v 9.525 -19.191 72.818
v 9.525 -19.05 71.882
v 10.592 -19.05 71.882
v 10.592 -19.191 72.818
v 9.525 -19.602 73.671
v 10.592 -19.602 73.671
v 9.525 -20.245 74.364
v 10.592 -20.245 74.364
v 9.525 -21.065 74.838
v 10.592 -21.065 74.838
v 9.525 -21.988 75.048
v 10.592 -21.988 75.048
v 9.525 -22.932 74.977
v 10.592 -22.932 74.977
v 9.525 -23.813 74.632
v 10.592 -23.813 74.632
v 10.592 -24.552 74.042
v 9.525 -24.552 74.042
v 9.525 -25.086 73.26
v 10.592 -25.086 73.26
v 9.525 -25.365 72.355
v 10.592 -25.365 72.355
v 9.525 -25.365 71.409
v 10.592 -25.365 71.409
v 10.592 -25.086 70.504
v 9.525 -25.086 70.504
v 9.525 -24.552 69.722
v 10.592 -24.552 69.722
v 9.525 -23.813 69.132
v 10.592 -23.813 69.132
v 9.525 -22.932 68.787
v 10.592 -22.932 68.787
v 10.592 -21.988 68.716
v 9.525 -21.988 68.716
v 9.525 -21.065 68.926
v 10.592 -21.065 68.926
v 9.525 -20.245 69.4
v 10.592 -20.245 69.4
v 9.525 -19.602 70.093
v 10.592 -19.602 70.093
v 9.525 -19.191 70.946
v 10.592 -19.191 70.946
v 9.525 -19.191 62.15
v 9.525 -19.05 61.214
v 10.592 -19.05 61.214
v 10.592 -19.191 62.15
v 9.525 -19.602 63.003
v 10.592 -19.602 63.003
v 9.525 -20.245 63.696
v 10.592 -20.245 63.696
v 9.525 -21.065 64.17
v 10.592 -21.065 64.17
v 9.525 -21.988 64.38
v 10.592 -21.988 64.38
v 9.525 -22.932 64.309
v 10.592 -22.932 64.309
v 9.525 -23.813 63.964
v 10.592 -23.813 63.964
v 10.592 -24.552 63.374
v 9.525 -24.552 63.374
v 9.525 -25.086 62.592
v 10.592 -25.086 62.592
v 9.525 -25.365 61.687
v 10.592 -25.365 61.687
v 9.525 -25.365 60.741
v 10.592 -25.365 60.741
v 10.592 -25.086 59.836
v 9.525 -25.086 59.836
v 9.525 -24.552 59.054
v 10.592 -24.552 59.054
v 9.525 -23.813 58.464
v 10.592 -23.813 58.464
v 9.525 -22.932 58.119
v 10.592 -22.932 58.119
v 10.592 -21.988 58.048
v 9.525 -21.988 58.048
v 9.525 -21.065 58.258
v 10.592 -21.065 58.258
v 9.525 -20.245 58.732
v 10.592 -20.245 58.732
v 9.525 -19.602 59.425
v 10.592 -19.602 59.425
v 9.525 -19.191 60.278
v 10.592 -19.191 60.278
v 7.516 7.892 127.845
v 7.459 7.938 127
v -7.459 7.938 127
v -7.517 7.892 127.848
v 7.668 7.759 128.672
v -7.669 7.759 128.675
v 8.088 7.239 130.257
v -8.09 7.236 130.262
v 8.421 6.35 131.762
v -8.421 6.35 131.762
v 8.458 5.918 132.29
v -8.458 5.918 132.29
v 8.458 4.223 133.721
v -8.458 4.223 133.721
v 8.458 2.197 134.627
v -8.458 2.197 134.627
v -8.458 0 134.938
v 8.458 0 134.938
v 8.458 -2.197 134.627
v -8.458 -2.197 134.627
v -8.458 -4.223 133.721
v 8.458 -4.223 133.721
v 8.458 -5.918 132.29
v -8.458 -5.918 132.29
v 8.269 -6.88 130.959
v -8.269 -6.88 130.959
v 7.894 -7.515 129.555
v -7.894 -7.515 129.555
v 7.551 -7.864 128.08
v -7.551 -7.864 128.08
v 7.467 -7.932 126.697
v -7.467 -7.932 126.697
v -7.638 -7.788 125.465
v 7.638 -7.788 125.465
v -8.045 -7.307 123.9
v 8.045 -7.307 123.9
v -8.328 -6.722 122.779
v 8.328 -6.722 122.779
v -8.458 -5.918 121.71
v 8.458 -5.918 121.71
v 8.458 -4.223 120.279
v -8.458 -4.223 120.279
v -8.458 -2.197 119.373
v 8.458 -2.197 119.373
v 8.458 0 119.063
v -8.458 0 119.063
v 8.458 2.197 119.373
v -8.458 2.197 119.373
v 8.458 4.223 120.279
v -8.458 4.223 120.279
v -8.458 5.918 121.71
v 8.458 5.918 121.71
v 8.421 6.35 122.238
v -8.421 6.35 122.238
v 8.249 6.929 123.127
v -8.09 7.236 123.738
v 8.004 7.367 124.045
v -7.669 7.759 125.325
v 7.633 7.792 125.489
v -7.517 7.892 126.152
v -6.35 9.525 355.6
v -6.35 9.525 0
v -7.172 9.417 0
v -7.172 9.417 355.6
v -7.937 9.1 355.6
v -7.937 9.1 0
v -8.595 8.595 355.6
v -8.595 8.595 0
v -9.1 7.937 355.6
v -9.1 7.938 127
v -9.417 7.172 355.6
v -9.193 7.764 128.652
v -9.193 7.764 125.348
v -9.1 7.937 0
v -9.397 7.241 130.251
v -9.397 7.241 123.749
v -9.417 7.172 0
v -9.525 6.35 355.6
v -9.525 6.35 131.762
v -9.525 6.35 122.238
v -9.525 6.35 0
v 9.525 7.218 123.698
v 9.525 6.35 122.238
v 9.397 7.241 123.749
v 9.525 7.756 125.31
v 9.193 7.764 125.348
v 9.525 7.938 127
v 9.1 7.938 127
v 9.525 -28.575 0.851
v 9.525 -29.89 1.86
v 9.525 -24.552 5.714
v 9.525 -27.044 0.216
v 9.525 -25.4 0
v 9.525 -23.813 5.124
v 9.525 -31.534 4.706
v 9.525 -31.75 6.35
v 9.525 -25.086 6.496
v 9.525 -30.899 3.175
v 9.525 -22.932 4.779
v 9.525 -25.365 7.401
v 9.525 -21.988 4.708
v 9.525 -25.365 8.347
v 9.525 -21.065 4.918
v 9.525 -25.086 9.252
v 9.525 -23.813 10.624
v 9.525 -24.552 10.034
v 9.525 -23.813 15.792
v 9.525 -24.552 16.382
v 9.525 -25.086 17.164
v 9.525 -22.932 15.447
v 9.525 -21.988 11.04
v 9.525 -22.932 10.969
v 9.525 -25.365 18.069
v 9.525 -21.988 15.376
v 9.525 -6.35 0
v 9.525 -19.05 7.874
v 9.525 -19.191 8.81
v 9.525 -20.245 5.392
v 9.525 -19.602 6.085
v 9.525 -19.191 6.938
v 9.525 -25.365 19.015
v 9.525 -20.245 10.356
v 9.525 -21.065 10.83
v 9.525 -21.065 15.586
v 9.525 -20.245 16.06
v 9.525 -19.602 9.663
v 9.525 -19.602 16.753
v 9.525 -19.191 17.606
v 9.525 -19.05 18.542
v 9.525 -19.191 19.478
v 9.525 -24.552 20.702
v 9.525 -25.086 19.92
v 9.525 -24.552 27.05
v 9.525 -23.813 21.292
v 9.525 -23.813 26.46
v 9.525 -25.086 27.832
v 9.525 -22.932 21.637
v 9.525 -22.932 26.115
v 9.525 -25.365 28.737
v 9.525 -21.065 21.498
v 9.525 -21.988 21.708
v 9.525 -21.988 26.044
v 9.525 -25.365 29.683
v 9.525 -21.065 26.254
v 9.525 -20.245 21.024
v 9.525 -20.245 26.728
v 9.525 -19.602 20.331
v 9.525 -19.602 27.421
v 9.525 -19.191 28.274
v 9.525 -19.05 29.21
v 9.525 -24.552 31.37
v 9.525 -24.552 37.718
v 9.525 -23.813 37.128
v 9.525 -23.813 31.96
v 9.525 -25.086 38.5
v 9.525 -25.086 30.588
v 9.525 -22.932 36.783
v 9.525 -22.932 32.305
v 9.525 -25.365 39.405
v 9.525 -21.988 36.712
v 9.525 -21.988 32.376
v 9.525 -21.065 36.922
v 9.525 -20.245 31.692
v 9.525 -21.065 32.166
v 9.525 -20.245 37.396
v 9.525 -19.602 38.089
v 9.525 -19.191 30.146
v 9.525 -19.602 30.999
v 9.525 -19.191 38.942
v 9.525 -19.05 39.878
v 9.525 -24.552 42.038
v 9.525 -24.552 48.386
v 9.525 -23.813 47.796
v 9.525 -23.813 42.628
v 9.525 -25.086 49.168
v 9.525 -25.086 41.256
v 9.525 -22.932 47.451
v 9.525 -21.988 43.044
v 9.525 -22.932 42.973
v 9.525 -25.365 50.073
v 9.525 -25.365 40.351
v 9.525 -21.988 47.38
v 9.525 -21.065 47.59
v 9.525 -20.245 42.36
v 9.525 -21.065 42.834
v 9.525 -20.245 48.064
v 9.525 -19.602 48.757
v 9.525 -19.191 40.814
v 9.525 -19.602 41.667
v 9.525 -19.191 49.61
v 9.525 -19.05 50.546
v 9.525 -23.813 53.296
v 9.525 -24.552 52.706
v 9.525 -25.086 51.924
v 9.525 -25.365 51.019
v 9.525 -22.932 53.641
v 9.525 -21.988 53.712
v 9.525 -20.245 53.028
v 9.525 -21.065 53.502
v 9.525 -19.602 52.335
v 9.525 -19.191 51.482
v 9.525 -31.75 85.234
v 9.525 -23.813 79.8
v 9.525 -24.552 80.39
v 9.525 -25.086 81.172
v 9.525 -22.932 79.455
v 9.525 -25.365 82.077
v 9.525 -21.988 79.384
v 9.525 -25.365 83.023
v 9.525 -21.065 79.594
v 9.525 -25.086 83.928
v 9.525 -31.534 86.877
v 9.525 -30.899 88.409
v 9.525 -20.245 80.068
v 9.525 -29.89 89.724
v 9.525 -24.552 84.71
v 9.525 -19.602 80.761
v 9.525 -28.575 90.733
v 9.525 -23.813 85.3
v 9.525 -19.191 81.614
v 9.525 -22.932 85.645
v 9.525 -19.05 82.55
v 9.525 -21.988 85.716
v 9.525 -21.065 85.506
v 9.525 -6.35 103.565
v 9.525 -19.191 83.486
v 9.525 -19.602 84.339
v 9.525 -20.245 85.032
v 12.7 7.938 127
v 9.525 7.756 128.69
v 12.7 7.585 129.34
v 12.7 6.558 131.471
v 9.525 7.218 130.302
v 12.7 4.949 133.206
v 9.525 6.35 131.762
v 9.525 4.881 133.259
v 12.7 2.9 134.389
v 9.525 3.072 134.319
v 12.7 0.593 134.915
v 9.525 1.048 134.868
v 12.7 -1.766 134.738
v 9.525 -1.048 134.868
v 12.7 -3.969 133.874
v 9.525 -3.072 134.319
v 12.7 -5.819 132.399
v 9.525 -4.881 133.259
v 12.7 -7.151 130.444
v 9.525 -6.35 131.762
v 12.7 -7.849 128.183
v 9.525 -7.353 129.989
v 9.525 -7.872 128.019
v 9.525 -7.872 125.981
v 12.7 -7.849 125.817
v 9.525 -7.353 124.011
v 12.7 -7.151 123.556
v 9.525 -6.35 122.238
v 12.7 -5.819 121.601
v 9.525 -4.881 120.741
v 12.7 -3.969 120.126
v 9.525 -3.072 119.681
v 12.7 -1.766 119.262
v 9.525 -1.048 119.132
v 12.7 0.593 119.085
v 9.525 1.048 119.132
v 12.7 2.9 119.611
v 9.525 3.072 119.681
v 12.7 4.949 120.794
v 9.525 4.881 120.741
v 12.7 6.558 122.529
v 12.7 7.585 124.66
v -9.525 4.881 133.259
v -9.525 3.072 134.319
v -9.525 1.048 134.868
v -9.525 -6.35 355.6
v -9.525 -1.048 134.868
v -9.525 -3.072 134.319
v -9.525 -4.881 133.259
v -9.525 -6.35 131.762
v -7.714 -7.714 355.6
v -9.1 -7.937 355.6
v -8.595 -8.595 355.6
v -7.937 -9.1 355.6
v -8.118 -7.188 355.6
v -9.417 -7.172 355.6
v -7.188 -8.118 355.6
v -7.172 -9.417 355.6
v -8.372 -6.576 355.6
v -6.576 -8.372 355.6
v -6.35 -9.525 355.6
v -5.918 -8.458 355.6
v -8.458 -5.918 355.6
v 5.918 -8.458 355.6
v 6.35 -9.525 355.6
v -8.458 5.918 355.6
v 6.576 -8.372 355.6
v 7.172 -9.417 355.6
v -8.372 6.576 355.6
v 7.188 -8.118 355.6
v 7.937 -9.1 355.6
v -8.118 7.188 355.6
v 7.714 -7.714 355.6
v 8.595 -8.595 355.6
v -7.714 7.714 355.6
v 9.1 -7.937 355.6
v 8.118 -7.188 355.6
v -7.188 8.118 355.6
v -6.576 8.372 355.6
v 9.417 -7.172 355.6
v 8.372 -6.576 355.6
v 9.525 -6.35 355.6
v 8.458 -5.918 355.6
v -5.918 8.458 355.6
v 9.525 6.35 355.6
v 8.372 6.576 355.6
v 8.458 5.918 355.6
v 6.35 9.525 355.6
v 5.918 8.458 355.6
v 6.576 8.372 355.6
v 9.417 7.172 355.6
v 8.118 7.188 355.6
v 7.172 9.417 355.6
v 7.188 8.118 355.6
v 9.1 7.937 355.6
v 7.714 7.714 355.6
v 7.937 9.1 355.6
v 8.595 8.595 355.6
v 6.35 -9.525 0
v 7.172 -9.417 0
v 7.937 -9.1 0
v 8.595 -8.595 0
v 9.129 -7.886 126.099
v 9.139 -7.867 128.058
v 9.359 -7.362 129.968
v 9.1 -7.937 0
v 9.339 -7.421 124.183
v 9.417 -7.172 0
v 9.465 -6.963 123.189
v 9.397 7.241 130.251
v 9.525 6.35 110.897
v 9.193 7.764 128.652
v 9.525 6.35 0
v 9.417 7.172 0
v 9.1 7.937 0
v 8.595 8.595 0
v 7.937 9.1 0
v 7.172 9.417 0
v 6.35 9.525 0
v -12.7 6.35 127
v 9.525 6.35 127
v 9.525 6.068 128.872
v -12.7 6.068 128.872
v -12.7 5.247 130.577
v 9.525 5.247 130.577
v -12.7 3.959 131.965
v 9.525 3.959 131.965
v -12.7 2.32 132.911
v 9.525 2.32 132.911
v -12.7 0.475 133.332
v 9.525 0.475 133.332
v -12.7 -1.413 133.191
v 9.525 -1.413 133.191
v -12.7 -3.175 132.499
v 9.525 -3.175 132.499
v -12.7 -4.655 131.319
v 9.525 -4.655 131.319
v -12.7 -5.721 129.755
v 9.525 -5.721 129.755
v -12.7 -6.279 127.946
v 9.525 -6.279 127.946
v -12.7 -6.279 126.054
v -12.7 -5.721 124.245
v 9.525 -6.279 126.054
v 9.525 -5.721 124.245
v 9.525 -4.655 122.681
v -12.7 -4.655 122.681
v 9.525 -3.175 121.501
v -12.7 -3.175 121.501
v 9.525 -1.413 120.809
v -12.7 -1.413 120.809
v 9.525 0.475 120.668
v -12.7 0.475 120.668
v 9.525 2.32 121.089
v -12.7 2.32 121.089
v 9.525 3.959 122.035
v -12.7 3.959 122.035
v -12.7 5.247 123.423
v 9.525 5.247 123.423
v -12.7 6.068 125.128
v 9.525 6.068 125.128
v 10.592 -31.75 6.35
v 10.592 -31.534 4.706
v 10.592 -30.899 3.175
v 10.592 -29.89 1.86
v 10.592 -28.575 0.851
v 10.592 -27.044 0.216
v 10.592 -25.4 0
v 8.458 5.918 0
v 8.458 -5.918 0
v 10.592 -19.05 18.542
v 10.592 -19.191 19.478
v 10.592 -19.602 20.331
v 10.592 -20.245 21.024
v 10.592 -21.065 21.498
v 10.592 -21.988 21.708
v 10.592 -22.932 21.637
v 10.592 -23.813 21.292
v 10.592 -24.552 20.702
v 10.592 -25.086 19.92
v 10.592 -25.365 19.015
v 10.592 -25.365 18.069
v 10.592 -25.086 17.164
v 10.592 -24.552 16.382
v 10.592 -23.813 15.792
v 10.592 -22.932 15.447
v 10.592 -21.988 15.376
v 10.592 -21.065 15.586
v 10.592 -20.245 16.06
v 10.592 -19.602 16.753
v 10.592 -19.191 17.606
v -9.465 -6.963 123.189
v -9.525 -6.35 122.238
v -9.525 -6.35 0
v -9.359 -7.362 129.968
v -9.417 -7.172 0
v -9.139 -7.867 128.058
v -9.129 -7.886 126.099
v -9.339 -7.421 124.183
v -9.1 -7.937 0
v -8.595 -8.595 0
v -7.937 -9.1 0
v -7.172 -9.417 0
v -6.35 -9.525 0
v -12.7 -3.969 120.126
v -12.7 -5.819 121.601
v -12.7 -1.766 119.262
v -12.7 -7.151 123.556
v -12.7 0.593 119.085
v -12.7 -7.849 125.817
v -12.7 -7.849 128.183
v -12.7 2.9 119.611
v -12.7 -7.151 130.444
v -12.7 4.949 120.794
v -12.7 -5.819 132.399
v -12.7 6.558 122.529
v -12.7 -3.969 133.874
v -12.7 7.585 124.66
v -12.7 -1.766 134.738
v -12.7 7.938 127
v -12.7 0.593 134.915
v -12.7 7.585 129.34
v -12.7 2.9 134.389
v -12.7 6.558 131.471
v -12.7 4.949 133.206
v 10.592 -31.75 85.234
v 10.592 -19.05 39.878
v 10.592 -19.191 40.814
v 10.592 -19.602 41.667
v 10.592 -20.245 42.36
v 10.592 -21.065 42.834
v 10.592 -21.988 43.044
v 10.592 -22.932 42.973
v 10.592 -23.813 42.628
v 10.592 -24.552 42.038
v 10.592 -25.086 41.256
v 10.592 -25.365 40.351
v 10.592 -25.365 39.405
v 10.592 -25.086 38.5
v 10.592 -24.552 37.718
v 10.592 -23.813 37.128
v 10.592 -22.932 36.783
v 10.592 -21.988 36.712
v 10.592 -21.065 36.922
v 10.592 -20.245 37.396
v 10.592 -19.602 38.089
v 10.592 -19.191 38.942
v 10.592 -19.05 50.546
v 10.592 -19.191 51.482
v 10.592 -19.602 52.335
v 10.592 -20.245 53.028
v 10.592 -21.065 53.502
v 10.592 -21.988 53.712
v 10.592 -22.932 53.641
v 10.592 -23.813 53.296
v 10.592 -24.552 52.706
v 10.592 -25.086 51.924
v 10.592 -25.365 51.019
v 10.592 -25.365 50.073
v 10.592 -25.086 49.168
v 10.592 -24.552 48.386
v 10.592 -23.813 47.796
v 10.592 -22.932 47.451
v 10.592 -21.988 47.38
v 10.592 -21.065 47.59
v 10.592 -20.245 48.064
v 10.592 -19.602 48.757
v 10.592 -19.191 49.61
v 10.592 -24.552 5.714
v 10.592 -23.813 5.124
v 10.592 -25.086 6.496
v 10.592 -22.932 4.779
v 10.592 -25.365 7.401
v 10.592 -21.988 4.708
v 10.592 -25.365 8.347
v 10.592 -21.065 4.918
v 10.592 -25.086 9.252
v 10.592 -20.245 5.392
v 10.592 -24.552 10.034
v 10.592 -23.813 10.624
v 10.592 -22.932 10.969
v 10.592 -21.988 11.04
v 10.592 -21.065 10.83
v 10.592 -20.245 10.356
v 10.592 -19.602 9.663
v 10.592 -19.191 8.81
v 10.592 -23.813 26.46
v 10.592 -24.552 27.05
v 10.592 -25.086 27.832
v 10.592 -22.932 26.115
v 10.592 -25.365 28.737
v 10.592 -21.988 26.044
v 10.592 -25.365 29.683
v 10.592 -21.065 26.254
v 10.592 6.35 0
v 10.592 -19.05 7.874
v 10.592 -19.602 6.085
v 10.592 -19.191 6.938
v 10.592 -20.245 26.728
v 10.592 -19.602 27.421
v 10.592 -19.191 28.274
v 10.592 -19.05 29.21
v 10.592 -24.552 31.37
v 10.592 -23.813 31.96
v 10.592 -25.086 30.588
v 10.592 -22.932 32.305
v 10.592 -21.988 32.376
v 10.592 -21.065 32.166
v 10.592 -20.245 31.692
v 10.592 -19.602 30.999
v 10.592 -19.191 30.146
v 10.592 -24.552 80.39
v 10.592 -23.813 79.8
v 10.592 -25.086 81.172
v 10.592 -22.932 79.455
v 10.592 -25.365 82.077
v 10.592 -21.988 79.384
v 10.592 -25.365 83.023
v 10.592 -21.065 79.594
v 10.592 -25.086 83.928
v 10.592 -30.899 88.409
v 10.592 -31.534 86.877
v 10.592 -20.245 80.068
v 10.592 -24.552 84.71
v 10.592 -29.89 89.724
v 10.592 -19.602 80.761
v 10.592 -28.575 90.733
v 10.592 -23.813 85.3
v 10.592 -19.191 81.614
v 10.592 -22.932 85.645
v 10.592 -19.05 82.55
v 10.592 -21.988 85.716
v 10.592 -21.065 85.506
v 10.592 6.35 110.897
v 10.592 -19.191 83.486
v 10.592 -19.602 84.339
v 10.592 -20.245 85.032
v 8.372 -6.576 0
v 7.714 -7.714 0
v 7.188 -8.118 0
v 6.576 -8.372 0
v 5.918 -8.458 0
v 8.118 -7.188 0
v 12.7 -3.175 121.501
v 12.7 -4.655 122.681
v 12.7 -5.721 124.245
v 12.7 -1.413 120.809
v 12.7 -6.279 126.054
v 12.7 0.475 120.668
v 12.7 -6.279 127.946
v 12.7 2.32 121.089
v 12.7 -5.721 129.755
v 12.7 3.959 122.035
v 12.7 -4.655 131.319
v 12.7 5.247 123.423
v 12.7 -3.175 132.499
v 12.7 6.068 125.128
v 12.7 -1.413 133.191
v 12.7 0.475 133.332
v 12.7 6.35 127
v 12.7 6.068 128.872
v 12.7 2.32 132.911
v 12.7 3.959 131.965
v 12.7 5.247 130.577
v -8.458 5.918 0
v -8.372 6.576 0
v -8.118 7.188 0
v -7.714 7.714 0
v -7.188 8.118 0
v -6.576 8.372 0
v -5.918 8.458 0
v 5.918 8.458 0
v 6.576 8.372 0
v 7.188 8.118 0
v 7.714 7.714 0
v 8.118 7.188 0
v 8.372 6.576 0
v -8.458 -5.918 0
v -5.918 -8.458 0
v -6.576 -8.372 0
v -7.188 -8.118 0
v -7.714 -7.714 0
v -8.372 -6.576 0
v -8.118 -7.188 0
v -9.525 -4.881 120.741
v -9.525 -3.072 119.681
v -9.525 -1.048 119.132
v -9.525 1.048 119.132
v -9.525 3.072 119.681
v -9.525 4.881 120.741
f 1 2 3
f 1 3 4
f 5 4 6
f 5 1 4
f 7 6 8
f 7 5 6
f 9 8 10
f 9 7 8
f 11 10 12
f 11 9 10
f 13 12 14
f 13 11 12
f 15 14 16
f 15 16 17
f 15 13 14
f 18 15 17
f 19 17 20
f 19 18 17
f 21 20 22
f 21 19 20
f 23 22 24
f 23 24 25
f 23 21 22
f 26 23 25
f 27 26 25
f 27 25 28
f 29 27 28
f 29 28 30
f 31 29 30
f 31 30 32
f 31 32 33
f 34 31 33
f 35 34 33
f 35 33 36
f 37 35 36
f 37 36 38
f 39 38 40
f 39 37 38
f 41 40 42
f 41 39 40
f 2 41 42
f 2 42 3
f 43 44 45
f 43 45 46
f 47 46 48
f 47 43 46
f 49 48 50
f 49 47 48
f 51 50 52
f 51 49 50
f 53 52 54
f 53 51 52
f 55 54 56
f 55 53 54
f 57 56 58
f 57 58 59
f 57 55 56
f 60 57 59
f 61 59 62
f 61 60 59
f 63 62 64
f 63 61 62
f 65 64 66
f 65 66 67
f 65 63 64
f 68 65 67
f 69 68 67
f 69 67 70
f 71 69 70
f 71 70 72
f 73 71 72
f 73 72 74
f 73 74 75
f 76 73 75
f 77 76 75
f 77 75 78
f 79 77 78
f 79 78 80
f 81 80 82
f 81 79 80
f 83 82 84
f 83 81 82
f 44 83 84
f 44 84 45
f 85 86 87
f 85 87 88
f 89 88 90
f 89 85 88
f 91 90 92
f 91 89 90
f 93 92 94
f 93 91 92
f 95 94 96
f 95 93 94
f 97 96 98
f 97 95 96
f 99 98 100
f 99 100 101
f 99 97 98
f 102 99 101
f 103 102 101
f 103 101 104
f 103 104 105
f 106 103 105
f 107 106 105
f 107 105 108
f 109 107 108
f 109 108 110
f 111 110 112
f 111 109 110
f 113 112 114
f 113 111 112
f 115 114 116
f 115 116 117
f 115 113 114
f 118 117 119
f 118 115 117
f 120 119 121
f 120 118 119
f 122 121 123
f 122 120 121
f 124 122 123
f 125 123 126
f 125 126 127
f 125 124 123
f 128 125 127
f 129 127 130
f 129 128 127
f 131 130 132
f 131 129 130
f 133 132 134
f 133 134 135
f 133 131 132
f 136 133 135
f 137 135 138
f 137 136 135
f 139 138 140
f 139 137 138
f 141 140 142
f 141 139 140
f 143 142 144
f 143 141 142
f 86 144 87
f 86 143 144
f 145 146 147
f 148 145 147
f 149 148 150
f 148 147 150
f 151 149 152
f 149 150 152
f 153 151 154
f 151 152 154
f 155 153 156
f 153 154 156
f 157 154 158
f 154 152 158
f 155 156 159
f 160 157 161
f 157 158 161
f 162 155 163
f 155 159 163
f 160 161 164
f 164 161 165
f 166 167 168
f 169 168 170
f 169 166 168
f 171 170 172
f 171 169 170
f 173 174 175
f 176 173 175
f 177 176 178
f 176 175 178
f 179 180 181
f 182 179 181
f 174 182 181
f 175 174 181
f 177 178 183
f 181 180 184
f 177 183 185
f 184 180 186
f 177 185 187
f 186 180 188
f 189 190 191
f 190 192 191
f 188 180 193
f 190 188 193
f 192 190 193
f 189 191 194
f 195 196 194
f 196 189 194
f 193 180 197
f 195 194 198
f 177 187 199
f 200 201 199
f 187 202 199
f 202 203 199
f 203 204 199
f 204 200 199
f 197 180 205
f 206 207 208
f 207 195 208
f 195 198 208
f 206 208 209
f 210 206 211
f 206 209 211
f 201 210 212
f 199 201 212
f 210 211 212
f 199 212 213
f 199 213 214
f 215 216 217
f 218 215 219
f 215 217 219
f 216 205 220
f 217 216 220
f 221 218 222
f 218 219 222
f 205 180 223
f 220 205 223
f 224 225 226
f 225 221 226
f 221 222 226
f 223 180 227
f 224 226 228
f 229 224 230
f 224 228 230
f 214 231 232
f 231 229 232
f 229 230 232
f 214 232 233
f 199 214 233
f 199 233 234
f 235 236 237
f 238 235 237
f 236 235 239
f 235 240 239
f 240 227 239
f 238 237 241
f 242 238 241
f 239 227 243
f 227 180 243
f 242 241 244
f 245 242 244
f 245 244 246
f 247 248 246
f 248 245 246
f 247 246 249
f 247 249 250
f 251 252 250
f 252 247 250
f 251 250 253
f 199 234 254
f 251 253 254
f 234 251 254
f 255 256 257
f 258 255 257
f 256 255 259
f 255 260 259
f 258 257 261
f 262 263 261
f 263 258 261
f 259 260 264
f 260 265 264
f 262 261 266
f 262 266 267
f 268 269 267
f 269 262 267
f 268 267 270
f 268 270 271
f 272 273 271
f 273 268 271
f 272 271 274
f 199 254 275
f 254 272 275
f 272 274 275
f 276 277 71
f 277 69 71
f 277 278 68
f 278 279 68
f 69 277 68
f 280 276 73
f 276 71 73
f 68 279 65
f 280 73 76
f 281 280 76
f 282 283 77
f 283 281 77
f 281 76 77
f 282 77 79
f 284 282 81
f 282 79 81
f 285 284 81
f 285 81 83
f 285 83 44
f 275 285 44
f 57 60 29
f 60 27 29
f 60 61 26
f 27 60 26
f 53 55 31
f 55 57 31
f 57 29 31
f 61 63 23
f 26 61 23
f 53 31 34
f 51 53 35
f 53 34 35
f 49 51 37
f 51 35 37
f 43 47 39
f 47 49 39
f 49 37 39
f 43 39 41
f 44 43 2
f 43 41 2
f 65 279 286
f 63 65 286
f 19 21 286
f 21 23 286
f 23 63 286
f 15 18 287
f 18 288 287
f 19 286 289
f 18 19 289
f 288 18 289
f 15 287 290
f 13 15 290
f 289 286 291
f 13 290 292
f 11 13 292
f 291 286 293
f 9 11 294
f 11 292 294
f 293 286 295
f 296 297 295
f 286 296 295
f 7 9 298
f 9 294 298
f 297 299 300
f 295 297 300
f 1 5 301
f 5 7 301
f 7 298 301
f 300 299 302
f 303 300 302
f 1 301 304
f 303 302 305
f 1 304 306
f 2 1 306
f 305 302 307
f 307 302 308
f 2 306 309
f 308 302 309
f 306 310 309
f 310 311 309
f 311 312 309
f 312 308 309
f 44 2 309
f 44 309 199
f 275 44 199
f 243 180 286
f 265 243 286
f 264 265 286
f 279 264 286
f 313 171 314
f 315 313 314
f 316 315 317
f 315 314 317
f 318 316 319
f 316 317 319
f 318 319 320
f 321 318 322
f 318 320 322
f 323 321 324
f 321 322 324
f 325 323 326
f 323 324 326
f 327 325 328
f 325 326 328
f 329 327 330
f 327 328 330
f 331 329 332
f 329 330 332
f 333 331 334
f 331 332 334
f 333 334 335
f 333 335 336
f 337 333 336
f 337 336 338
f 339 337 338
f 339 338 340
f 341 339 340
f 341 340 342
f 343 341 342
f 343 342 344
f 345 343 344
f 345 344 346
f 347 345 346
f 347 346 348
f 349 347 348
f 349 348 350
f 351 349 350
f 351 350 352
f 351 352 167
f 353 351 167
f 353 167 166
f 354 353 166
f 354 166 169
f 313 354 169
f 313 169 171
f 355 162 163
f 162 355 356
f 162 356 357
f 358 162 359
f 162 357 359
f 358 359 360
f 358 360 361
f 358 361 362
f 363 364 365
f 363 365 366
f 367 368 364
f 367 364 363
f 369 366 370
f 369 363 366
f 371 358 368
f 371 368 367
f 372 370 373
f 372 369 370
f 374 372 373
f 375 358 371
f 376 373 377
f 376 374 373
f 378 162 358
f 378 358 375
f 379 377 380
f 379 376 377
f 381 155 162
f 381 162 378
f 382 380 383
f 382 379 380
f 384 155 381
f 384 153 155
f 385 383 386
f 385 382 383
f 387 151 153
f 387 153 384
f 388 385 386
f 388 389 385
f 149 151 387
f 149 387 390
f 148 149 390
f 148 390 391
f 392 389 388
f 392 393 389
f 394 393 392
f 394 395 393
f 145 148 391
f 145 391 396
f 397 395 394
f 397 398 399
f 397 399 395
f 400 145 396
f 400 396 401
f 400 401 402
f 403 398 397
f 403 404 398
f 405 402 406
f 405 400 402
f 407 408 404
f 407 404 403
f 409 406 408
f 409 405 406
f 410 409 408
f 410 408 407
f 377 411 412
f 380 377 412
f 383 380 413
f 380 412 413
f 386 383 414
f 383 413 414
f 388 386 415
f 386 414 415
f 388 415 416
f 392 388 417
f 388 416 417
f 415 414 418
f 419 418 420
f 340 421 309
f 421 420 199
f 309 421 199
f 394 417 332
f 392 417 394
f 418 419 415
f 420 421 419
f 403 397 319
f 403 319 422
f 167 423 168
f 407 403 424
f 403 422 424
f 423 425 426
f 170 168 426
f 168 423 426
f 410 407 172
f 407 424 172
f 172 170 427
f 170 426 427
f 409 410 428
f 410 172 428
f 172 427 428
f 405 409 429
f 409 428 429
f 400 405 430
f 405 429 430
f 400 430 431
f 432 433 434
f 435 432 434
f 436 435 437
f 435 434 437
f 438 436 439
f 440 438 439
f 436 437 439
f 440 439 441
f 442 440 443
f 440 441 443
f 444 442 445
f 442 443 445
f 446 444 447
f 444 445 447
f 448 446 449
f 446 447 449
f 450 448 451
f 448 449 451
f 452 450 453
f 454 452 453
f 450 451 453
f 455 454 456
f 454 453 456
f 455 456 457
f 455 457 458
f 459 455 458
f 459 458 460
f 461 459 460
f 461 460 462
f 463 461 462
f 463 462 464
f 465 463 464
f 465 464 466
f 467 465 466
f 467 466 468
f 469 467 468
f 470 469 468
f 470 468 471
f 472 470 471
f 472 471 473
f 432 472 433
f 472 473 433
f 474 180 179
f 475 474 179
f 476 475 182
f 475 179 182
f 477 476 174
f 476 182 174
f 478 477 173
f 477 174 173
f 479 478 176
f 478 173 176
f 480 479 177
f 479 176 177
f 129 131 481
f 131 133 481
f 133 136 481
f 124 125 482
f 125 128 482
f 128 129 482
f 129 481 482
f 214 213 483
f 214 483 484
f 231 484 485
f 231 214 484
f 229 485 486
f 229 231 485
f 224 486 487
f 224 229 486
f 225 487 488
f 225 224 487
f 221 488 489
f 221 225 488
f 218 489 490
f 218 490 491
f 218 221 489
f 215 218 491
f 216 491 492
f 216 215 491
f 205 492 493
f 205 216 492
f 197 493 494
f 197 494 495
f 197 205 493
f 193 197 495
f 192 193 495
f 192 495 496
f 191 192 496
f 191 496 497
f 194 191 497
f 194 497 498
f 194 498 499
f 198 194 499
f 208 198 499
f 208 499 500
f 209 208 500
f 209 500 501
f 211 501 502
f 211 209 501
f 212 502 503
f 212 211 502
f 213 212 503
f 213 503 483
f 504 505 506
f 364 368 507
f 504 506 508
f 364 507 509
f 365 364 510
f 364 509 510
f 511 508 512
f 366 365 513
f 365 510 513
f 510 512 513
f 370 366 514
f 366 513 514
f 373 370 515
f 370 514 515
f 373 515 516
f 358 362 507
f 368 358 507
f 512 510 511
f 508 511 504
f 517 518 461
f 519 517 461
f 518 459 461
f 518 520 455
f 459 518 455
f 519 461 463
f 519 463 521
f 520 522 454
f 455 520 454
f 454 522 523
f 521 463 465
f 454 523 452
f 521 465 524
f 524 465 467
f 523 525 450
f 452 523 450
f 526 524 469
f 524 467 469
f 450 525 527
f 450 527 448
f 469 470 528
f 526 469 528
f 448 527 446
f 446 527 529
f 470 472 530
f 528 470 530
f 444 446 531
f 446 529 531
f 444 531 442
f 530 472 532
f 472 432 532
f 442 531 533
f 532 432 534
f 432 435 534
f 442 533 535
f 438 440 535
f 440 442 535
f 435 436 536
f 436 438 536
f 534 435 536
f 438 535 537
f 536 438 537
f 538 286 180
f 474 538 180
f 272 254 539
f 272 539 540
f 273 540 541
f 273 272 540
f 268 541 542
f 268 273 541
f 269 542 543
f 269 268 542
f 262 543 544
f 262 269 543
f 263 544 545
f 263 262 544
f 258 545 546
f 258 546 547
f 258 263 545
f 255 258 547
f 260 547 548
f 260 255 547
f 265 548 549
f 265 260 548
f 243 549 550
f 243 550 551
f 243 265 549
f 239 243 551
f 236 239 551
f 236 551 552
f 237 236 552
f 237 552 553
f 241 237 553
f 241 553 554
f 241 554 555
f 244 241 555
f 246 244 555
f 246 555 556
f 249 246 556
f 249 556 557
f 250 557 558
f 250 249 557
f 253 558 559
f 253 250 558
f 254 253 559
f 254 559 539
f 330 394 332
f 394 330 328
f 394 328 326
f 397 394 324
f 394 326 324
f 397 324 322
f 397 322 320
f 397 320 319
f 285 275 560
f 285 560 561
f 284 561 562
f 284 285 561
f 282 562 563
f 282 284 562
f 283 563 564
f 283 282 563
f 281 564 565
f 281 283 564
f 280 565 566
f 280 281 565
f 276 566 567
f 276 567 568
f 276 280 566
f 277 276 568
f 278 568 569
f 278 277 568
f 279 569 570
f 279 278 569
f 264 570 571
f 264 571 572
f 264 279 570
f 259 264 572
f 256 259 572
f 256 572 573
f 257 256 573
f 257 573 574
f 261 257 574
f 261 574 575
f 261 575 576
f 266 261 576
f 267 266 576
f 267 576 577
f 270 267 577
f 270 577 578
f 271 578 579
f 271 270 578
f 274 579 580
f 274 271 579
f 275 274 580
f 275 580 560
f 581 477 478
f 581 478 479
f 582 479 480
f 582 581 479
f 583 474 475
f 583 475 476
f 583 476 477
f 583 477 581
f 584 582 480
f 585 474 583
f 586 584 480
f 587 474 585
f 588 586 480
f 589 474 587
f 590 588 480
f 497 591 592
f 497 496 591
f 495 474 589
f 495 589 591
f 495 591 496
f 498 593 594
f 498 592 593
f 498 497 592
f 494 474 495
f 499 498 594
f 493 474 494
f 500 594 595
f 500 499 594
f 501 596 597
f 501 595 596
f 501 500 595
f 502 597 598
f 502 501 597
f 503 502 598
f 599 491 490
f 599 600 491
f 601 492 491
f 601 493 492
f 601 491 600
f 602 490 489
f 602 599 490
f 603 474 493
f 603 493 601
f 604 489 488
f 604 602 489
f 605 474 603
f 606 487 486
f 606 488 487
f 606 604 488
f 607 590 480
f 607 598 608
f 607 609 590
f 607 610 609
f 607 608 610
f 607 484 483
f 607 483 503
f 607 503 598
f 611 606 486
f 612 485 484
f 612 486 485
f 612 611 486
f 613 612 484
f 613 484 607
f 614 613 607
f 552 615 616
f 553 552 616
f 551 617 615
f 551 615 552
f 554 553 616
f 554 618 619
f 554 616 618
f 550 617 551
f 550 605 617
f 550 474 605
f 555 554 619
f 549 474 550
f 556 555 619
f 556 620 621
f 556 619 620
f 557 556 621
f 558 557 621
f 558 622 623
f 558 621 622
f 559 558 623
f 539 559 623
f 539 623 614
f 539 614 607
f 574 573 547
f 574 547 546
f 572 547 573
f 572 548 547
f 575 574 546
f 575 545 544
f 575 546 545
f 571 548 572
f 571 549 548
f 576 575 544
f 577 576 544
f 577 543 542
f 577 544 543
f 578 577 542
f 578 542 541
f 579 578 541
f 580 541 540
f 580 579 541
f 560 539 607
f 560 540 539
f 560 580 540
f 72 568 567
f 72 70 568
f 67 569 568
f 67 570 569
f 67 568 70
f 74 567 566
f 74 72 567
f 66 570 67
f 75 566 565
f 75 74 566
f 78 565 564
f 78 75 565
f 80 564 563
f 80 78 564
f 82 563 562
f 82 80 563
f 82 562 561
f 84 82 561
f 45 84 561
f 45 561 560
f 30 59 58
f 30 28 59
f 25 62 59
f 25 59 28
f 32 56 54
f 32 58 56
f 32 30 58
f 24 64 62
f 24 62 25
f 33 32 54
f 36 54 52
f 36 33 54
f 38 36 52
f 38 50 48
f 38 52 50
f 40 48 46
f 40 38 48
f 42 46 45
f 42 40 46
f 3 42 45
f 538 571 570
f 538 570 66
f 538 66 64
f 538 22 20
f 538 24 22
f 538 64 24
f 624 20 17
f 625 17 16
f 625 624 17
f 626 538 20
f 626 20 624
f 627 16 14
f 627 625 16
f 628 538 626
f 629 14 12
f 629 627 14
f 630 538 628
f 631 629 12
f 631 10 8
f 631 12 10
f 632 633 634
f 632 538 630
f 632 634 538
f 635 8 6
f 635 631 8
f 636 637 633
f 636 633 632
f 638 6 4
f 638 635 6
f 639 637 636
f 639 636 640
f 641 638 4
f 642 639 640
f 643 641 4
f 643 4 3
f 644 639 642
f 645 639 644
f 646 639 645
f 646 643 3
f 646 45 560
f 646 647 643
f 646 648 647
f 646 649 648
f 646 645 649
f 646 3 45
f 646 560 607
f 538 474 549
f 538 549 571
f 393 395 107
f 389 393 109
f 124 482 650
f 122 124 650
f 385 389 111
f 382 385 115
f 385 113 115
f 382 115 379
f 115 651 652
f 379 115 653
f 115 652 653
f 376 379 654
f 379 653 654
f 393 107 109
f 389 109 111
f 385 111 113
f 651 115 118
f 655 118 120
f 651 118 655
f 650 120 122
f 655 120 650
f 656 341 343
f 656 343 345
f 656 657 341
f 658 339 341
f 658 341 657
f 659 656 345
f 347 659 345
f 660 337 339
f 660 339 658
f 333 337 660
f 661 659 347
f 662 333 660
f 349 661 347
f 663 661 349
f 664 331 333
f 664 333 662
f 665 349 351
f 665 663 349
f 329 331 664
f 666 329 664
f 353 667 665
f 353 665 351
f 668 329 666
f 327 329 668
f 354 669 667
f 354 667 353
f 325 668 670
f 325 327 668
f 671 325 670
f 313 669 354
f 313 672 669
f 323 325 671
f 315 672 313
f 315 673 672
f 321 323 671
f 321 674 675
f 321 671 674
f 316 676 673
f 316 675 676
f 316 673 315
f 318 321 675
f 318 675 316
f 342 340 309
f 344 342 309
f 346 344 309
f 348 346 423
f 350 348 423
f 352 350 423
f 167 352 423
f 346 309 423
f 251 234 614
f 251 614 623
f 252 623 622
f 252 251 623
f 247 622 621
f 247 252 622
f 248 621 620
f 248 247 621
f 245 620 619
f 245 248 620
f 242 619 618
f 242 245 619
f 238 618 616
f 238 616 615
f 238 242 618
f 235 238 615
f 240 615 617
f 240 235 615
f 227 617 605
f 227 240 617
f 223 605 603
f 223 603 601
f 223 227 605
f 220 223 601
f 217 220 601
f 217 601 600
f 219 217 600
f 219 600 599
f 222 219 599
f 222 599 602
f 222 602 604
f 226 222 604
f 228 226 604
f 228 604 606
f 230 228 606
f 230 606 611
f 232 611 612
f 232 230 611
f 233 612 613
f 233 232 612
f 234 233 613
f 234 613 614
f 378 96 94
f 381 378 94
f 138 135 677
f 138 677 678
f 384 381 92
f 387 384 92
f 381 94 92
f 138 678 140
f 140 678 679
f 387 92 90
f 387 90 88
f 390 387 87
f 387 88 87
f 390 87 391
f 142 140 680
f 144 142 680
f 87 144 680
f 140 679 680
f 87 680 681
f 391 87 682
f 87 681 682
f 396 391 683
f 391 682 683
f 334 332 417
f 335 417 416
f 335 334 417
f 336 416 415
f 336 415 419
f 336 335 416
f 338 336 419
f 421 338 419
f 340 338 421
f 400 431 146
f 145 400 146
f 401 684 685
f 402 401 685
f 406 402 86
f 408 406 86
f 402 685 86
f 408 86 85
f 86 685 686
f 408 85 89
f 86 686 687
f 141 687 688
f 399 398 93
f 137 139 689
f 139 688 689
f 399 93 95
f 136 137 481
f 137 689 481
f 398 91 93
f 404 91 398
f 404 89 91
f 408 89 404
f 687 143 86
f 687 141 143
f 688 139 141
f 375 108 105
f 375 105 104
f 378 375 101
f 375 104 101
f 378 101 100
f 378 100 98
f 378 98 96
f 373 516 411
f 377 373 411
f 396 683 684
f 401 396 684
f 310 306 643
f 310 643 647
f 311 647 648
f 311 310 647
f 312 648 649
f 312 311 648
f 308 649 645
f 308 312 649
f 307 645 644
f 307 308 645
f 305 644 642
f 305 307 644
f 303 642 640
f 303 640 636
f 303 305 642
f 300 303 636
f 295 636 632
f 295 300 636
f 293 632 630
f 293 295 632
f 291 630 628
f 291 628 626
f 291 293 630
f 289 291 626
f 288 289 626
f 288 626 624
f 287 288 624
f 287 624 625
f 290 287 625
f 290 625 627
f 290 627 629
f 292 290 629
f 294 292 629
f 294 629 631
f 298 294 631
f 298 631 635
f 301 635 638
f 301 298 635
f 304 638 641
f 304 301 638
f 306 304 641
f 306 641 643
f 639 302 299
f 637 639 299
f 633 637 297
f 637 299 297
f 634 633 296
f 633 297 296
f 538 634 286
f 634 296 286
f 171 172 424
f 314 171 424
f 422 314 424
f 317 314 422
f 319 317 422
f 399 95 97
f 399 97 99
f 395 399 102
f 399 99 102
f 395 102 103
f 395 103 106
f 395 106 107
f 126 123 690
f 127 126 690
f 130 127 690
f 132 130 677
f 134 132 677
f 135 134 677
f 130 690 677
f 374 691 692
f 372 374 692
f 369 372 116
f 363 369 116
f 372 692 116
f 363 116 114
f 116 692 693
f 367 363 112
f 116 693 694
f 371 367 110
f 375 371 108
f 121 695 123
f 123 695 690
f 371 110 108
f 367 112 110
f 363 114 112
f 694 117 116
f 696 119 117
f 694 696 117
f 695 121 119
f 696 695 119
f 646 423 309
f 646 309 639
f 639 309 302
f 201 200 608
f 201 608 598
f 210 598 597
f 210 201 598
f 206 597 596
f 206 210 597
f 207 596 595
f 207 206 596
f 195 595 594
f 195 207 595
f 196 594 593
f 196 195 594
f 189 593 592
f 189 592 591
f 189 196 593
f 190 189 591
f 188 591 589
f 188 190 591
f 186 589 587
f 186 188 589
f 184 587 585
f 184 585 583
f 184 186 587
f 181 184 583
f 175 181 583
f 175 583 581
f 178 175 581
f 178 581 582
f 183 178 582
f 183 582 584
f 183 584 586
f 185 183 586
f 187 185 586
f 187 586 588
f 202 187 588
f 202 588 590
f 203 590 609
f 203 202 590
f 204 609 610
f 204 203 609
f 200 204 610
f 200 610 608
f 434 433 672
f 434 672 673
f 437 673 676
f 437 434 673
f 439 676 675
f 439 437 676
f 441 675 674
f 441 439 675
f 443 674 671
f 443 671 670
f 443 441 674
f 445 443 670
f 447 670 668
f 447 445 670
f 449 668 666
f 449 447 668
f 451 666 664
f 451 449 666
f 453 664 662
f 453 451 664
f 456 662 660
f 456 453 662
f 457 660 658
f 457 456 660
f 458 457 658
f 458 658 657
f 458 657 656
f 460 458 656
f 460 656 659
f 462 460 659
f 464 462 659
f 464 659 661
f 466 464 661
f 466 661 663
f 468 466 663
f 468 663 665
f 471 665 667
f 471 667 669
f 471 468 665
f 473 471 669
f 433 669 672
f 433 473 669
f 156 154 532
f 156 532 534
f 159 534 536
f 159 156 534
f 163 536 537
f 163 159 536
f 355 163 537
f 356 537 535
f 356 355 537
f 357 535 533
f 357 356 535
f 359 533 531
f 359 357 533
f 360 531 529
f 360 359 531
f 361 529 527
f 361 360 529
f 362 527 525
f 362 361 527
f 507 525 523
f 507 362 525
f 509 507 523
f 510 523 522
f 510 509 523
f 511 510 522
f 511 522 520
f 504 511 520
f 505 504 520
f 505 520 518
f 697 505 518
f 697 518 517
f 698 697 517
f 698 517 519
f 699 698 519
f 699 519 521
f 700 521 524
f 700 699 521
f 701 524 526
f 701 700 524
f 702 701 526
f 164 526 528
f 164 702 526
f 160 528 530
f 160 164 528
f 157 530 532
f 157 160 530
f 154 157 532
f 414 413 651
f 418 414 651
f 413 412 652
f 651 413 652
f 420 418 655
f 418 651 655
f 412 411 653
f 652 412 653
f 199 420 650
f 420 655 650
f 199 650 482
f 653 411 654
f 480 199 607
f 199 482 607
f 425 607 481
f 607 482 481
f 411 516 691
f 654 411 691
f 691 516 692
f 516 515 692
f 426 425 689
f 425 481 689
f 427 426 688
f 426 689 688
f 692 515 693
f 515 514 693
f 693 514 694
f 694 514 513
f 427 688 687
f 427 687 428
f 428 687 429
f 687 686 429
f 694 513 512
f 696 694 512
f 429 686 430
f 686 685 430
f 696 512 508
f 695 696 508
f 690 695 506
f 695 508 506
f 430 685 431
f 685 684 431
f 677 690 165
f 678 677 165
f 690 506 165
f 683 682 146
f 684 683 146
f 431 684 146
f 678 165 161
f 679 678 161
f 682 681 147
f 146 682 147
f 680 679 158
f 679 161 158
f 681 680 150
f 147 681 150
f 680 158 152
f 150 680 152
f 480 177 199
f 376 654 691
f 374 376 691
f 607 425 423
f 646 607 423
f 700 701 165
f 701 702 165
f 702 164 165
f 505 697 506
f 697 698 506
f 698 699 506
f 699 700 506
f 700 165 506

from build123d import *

# Parameters (mm, degrees)
F1_DEPTH      = 355.6
F3_DEPTH      = 19.051
F4_R          = 7.9375
F4_R_2        = 6.35
F5_DEPTH      = 3.175
F5_DEPTH_BACK = 22.225
F6_R          = 3.175
F7_DEPTH      = 1.0668


with BuildPart() as f1:
    # F0 (on Top) → F1 (new body)
    with BuildSketch(Plane.XY):
        with BuildLine():
            Line((-6.35, -9.525), (6.35, -9.525))
            ThreePointArc((6.35, -9.525), (8.595064, -8.595064), (9.525, -6.35))
            Line((9.525, -6.35), (9.525, 6.35))
            ThreePointArc((9.525, 6.35), (8.595064, 8.595064), (6.35, 9.525))
            Line((6.35, 9.525), (-6.35, 9.525))
            ThreePointArc((-6.35, 9.525), (-8.595064, 8.595064), (-9.525, 6.35))
            Line((-9.525, 6.35), (-9.525, -6.35))
            ThreePointArc((-9.525, -6.35), (-8.595064, -8.595064), (-6.35, -9.525))
        make_face()
        with BuildLine():
            ThreePointArc((-5.9182, -8.4582), (-7.714251, -7.714251), (-8.4582, -5.9182))
            Line((-8.4582, -5.9182), (-8.4582, 5.9182))
            ThreePointArc((-8.4582, 5.9182), (-7.714251, 7.714251), (-5.9182, 8.4582))
            Line((-5.9182, 8.4582), (5.9182, 8.4582))
            ThreePointArc((5.9182, 8.4582), (7.714251, 7.714251), (8.4582, 5.9182))
            Line((8.4582, 5.9182), (8.4582, -5.9182))
            ThreePointArc((8.4582, -5.9182), (7.714251, -7.714251), (5.9182, -8.4582))
            Line((5.9182, -8.4582), (-5.9182, -8.4582))
        make_face(mode=Mode.SUBTRACT)
    extrude(amount=F1_DEPTH)

    # F2 (on face) → F3 (cut, through all)
    with BuildSketch(Plane.YZ.offset(9.525)):
        with BuildLine():
            Line((-6.35, 122.2375), (-6.35, 131.7625))
            ThreePointArc((-6.35, 131.7625), (-7.9375, 127), (-6.35, 122.2375))
        make_face()
        with BuildLine():
            ThreePointArc((6.35, 122.2375), (7.530174, 124.489942), (7.9375, 127))
            ThreePointArc((7.9375, 127), (7.530174, 129.510058), (6.35, 131.7625))
            Line((6.35, 131.7625), (6.35, 122.2375))
        make_face()
        with BuildLine():
            Line((6.35, 122.2375), (6.35, 131.7625))
            ThreePointArc((6.35, 131.7625), (0, 134.9375), (-6.35, 131.7625))
            Line((-6.35, 131.7625), (-6.35, 122.2375))
            ThreePointArc((-6.35, 122.2375), (0, 119.0625), (6.35, 122.2375))
        make_face()
    extrude(amount=-F3_DEPTH, mode=Mode.SUBTRACT)

    # F4 (on face) → F5 (join, two sides)
    with BuildSketch(Plane.YZ.offset(9.525)) as f5_sk:
        with Locations((0, 127)):
            Circle(F4_R)
        with Locations((0, 127)):
            Circle(F4_R_2, mode=Mode.SUBTRACT)
    extrude(amount=F5_DEPTH)
    extrude(f5_sk.sketch, amount=-F5_DEPTH_BACK)

    # F6 (on face) → F7 (join)
    with BuildSketch(Plane.YZ.offset(9.525)):
        with BuildLine():
            Line((-25.4, 0), (6.35, 0))
            Line((6.35, 0), (6.35, 110.897045))
            Line((6.35, 110.897045), (-28.575, 90.733087))
            ThreePointArc((-28.575, 90.733087), (-30.899261, 88.408826), (-31.75, 85.233826))
            Line((-31.75, 85.233826), (-31.75, 6.35))
            ThreePointArc((-31.75, 6.35), (-29.890128, 1.859872), (-25.4, 0))
        make_face()
        with Locations((-22.225, 7.874)):
            Circle(F6_R, mode=Mode.SUBTRACT)
        with Locations((-22.225, 18.542)):
            Circle(F6_R, mode=Mode.SUBTRACT)
        with Locations((-22.225, 29.21)):
            Circle(F6_R, mode=Mode.SUBTRACT)
        with Locations((-22.225, 39.878)):
            Circle(F6_R, mode=Mode.SUBTRACT)
        with Locations((-22.225, 50.546)):
            Circle(F6_R, mode=Mode.SUBTRACT)
        with Locations((-22.225, 61.214)):
            Circle(F6_R, mode=Mode.SUBTRACT)
        with Locations((-22.225, 71.882)):
            Circle(F6_R, mode=Mode.SUBTRACT)
        with Locations((-22.225, 82.55)):
            Circle(F6_R, mode=Mode.SUBTRACT)
    extrude(amount=F7_DEPTH)


solid = f1.part
